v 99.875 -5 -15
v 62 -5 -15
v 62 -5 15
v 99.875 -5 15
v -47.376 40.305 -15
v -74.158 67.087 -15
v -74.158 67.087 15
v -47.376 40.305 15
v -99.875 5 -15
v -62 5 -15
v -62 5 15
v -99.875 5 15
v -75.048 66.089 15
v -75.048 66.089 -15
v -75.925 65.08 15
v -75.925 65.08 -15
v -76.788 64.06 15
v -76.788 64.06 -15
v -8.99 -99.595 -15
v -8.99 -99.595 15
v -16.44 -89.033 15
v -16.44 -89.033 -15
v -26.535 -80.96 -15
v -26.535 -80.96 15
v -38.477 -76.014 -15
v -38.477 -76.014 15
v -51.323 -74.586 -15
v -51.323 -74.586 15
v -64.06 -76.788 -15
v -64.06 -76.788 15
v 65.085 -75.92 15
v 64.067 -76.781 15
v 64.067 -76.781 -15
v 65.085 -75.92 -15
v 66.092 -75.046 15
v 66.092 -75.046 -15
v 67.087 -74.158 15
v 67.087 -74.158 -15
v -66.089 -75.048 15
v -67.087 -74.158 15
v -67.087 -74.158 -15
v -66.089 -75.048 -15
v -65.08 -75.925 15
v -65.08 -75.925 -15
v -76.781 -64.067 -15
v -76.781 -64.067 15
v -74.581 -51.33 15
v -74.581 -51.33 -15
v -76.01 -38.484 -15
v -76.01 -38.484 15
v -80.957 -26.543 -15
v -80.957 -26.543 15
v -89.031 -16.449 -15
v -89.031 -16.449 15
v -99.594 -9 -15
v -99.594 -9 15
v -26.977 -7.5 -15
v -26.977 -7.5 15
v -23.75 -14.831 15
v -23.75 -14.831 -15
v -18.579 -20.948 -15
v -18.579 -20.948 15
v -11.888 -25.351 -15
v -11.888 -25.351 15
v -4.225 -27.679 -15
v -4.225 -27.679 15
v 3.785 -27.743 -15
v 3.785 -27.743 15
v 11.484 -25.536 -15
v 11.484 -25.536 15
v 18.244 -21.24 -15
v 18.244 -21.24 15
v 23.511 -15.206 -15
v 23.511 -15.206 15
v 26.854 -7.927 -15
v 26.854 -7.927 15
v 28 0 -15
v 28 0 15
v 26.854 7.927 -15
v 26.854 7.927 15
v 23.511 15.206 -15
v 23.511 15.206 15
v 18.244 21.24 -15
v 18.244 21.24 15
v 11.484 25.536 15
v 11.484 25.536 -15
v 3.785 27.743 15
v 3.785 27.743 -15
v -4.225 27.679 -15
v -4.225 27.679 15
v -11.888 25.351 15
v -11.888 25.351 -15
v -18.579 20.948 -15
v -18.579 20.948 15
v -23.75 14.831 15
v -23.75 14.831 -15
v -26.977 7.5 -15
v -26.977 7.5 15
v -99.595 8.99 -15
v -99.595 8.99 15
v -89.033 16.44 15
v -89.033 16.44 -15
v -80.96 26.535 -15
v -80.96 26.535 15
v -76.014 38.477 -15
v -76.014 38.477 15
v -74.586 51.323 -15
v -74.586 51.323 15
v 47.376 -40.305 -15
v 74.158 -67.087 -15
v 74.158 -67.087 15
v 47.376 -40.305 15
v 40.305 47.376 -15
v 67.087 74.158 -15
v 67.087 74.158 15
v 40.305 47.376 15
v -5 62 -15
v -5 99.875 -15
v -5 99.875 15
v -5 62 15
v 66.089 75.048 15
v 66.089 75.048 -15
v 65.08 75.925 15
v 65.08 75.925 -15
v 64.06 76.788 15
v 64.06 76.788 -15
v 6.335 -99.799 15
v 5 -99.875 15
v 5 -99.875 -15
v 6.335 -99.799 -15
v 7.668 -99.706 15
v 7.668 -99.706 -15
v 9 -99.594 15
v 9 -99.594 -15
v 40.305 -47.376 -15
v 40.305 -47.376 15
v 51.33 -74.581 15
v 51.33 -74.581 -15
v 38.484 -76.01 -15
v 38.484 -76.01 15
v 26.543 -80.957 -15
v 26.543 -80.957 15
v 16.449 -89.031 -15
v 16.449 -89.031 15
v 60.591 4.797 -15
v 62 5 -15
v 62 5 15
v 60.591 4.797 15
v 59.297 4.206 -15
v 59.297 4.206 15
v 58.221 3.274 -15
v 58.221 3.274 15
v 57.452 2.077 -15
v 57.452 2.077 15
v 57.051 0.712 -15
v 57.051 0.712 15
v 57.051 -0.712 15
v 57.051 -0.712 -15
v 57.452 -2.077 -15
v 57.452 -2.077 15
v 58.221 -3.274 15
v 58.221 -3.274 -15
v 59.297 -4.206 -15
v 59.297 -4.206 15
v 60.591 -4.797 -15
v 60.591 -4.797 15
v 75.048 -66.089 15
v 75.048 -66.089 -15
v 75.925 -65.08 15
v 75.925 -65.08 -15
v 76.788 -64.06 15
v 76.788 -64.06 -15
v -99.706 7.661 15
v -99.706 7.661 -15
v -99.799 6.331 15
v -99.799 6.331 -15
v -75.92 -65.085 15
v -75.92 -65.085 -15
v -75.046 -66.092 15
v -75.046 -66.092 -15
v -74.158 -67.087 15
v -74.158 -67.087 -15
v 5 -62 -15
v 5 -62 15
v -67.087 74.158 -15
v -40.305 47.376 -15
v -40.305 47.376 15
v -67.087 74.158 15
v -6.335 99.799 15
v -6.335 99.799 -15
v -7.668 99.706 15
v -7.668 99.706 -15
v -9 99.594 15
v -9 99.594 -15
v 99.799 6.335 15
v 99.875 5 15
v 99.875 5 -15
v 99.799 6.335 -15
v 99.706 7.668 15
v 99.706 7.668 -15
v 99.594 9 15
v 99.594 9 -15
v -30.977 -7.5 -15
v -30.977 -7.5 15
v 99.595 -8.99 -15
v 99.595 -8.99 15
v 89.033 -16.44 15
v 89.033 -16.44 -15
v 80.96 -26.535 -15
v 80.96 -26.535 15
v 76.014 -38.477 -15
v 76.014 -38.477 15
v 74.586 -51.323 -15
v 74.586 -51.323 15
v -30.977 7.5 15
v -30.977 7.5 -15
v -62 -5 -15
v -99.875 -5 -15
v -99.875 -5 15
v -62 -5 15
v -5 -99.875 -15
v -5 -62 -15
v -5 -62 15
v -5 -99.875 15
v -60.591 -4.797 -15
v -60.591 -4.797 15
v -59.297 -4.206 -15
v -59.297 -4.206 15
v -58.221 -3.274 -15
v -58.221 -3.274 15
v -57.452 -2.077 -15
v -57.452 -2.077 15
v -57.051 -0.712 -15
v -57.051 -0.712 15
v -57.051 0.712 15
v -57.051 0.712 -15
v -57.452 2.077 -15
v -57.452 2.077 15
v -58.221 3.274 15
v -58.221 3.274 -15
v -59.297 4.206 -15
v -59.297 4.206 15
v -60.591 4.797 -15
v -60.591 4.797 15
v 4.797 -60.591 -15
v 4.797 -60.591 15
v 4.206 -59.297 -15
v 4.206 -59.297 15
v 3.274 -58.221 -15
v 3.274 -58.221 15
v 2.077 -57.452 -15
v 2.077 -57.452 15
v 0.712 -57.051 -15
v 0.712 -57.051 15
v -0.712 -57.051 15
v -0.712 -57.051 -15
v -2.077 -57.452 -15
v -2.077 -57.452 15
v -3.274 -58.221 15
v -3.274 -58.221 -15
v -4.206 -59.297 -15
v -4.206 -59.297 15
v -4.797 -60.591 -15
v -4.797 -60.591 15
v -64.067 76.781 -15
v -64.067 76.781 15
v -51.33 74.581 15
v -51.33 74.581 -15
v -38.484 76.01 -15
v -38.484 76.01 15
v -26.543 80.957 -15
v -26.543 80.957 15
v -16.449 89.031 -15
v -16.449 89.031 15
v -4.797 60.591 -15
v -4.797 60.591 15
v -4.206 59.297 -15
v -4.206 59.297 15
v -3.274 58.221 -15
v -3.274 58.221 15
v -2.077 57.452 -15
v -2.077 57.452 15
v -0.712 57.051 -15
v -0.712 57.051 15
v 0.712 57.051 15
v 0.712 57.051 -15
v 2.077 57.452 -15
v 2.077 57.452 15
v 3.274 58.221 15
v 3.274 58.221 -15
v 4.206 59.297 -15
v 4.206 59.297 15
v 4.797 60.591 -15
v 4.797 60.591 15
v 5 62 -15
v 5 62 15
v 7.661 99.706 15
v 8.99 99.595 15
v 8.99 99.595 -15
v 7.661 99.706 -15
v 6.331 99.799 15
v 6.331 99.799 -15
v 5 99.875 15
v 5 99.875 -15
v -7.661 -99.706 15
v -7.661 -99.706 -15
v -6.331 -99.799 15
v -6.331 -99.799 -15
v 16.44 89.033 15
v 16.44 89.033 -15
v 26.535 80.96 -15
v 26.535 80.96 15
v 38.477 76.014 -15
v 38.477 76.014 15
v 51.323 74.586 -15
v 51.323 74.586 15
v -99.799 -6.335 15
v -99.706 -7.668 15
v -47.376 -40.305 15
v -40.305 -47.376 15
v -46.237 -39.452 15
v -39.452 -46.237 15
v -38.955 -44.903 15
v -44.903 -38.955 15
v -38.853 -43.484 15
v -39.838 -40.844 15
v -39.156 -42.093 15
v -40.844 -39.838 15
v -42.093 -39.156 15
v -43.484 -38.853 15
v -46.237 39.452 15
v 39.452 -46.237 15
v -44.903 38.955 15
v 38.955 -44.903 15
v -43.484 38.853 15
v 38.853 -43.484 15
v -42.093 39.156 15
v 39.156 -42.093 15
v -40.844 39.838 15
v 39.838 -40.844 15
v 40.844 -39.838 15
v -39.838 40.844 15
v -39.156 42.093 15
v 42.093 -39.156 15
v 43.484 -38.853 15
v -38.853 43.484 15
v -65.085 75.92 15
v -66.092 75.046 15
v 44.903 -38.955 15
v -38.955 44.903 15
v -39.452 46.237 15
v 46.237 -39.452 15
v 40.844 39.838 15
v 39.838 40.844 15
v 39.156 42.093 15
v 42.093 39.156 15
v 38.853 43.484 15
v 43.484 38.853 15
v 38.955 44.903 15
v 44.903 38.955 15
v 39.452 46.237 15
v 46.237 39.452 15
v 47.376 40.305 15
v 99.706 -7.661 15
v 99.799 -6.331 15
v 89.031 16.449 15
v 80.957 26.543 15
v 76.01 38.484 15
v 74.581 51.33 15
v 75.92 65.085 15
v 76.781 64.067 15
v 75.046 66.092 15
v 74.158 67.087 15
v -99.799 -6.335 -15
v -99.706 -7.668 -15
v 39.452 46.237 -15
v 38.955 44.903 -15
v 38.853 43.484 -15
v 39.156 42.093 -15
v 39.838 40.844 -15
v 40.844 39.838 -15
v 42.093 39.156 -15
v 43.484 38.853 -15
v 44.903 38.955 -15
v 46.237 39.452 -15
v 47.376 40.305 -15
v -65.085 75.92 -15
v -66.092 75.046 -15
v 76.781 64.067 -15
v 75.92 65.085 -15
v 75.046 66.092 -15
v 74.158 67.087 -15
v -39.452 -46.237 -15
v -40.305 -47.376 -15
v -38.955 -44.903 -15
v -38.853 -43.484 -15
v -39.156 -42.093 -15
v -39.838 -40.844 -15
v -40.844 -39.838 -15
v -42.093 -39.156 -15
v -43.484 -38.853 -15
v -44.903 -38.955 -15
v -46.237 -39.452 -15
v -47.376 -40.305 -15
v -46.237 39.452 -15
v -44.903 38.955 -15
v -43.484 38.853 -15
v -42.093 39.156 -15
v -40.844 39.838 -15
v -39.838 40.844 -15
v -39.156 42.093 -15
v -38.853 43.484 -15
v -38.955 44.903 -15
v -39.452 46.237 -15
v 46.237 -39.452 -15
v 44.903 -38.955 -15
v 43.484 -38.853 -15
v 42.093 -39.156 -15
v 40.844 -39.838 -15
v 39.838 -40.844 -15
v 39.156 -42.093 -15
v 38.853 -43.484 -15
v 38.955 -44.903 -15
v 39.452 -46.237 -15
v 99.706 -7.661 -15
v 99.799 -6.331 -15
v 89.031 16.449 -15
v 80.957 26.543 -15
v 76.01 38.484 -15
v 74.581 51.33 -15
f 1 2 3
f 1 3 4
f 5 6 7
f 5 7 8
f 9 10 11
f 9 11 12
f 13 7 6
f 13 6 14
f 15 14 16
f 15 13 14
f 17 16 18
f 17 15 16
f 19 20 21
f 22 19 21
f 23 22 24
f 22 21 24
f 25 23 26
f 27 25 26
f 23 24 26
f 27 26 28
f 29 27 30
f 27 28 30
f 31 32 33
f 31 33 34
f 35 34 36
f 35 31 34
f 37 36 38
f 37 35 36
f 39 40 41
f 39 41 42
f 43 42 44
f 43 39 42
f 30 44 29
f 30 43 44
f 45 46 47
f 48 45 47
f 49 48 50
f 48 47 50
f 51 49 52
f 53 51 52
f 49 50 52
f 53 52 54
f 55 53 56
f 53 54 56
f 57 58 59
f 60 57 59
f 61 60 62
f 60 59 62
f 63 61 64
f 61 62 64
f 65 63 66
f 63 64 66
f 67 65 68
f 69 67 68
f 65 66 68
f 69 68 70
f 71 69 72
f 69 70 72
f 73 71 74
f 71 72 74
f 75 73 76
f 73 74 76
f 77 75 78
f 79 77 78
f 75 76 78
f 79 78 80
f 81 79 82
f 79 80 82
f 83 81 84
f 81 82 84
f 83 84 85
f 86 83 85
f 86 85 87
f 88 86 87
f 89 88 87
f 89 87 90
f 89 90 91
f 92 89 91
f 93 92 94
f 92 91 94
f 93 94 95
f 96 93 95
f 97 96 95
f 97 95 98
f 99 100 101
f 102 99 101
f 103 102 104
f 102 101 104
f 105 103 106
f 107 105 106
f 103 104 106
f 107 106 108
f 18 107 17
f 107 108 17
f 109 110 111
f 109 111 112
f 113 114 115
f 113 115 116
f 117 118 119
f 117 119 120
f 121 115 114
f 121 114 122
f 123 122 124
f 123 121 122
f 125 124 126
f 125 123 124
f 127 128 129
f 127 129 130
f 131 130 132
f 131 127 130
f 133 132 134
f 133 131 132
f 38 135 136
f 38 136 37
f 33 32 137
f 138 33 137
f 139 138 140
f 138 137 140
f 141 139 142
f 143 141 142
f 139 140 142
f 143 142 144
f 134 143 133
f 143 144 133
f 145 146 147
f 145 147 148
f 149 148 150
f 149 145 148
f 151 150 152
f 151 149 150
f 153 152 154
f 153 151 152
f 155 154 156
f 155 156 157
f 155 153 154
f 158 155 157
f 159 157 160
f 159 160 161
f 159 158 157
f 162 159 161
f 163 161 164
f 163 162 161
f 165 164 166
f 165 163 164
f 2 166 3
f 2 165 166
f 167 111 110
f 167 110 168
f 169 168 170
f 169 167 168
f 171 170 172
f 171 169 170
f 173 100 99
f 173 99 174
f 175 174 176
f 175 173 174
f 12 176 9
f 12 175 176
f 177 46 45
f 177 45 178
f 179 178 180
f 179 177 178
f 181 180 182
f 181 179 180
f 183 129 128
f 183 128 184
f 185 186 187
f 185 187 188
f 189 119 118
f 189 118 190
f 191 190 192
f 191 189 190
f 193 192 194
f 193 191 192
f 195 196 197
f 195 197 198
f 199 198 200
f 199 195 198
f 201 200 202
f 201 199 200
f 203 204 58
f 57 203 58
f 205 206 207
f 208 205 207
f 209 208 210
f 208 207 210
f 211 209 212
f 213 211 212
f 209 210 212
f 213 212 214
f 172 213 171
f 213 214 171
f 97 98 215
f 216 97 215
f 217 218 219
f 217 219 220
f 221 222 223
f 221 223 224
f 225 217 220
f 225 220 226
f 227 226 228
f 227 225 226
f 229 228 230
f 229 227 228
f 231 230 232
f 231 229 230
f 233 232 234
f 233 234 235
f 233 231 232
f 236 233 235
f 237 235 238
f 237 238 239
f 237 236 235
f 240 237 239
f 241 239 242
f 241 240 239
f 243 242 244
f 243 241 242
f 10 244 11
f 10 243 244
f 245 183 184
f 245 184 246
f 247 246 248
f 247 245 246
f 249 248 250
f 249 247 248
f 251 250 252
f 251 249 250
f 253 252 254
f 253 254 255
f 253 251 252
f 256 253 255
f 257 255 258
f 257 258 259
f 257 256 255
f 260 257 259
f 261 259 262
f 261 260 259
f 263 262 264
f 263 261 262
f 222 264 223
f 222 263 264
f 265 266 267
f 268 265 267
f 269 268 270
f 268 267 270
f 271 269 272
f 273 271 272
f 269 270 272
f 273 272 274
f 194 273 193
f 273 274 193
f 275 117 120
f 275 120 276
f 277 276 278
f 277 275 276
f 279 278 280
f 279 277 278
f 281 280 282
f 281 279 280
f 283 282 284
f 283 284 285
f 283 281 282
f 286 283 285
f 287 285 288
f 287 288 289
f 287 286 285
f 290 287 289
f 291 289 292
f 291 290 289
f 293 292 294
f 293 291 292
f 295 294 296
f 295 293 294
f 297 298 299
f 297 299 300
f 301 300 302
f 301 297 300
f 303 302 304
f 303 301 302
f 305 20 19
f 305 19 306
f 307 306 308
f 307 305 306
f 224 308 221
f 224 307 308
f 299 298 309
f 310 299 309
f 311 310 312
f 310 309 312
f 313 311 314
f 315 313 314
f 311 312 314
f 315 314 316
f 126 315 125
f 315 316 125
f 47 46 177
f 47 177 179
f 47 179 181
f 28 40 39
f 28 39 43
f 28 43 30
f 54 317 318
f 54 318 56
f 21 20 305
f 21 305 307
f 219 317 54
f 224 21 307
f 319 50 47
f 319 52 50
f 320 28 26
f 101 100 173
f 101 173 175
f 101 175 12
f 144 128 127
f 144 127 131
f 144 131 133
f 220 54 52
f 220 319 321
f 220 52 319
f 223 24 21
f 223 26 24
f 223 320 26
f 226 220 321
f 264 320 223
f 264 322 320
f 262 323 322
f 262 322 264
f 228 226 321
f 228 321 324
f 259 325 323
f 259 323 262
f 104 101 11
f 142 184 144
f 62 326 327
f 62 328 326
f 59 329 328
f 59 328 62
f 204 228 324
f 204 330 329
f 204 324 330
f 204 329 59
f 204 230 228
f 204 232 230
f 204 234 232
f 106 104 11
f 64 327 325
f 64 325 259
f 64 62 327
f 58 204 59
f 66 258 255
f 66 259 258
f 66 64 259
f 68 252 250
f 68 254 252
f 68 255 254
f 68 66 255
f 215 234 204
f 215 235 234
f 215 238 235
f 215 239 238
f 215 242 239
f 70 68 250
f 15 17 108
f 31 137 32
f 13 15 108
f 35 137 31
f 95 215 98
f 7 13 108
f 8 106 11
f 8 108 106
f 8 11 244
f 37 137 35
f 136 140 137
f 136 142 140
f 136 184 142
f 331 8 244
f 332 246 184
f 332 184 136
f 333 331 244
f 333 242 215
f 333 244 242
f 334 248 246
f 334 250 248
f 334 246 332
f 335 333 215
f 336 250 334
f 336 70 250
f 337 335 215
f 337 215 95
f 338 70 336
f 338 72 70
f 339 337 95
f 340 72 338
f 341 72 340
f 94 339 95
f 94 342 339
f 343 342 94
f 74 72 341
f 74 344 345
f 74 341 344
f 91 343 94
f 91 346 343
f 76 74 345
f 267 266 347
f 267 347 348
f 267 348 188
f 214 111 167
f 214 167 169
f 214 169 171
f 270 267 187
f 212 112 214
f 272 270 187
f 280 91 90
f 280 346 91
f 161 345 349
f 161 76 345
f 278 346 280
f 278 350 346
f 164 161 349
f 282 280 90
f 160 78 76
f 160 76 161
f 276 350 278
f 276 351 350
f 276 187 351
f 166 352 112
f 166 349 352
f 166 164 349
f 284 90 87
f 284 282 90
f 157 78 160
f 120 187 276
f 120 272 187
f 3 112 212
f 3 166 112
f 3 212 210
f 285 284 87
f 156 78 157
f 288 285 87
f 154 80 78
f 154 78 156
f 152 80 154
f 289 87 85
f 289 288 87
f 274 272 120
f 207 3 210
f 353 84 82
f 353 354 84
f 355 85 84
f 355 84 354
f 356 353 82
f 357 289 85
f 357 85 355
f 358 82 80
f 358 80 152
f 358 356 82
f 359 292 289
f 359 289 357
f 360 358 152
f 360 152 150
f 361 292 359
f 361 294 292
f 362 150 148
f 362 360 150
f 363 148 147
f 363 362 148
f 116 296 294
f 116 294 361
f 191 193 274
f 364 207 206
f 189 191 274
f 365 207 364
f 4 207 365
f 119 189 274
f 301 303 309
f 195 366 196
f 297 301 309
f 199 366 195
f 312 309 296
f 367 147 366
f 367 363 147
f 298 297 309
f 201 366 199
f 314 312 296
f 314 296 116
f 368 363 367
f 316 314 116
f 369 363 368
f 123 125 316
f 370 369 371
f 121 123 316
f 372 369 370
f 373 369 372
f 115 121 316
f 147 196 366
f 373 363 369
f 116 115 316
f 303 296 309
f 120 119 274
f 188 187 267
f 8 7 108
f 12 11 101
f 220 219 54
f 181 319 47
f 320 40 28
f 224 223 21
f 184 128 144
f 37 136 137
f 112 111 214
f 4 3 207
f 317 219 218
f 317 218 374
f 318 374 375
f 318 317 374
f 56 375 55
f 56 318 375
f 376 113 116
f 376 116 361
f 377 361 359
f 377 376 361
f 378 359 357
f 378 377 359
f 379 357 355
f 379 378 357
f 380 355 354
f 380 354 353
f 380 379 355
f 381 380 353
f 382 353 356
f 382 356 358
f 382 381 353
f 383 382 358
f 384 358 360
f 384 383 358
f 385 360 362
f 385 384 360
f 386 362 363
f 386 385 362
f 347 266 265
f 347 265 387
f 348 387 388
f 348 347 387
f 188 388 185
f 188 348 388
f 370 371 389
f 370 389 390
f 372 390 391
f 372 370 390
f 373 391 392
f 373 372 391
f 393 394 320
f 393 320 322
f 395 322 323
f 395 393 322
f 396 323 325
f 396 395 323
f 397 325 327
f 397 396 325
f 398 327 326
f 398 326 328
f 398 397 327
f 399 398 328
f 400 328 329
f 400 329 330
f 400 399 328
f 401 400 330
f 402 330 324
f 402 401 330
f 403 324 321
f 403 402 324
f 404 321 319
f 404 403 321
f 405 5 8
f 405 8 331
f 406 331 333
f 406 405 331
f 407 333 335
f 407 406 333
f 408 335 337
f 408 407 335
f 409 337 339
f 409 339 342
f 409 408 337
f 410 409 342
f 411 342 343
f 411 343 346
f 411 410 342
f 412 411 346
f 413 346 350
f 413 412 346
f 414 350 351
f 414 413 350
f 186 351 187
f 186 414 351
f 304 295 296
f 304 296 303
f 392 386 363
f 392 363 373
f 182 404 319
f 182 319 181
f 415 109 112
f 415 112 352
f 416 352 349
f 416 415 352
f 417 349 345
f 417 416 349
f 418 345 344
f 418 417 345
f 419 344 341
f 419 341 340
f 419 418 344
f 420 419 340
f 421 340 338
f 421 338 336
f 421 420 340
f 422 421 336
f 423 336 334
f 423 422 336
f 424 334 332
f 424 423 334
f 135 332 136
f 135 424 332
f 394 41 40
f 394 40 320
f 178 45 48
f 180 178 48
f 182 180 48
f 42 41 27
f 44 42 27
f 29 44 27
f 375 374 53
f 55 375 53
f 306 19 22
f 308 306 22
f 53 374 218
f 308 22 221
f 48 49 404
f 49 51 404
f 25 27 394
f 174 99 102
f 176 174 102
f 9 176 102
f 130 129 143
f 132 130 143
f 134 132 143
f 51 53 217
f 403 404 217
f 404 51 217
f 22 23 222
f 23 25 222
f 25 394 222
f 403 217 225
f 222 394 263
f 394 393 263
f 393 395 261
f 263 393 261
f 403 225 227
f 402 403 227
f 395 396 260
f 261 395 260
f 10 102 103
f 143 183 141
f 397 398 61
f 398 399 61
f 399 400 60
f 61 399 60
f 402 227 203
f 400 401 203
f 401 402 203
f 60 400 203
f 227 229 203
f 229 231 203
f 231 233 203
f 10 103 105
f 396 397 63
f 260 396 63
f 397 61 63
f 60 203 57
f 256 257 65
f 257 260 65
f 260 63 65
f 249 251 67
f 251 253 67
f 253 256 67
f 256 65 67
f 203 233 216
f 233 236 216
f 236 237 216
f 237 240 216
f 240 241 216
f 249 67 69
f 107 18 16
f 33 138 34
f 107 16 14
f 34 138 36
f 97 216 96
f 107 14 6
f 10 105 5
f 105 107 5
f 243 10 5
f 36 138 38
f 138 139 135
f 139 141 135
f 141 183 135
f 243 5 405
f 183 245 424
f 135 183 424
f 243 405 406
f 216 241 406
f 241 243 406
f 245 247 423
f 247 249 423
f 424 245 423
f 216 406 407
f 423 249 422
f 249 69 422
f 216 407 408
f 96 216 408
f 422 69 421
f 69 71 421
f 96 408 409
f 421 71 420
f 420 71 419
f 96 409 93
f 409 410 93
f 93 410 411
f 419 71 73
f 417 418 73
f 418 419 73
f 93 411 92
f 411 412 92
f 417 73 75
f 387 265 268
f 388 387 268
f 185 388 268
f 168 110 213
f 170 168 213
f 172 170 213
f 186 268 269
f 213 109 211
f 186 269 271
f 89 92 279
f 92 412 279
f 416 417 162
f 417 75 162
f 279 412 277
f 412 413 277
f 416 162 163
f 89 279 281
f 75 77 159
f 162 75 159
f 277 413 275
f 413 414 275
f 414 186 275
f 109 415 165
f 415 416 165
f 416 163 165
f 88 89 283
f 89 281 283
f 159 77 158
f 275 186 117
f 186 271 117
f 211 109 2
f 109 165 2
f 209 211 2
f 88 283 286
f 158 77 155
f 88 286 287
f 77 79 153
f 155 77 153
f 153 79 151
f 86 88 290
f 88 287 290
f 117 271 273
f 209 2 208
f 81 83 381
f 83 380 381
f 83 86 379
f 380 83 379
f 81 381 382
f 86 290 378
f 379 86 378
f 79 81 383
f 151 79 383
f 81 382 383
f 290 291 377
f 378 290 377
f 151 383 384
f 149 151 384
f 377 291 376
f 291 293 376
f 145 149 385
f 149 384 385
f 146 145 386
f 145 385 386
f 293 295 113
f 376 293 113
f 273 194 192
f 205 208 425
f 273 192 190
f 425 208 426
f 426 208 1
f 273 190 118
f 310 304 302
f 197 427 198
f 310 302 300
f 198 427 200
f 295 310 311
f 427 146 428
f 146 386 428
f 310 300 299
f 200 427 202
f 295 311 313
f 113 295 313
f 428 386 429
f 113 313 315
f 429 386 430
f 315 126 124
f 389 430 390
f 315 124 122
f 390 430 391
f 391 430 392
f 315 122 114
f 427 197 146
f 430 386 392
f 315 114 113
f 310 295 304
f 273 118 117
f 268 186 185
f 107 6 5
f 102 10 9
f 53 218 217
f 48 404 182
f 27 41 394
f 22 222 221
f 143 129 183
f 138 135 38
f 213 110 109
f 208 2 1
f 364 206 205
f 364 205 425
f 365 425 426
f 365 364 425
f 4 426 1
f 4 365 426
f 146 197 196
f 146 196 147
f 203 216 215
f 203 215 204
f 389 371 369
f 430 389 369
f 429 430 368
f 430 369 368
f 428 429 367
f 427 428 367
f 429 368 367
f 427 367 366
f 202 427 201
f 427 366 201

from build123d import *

# Parameters (mm, degrees)
SKETCH1_R           = 100
BOSS_EXTRUDE1_DEPTH = 15
CUT_EXTRUDE2_START  = -30
CUT_EXTRUDE2_DEPTH  = 30
CIRPATTERN1_COUNT   = 8
CUT_EXTRUDE3_DEPTH  = 30
CIRPATTERN2_COUNT   = 8
CUT_EXTRUDE4_DEPTH  = 35


# Read off the part's stored shape, not the designer's step: Cut-Extrude2
with BuildPart() as part:
    # Sketch1 → Boss-Extrude1 (new, symmetric)
    with BuildSketch(Plane.XY):
        Circle(SKETCH1_R)
    extrude(amount=BOSS_EXTRUDE1_DEPTH, both=True)

    # Cut-Extrude2 outline → Cut-Extrude2 (cut)
    with BuildSketch(Plane.XY.offset(15).offset(CUT_EXTRUDE2_START)):
        with BuildLine():
            ThreePointArc((62, 5), (57, 0), (62, -5))
            Line((62, -5), (99.874921777, -5))
            ThreePointArc((99.874921777, -5), (100, 0), (99.874921777, 5))
            Line((99.874921777, 5), (62, 5))
        make_face()
    cut_extrude2 = extrude(amount=CUT_EXTRUDE2_DEPTH, mode=Mode.SUBTRACT)

    # CirPattern1: Cut-Extrude2 ×8 about axis
    cirpattern1_axis = Axis((0, 0, 15), (0, 0, -1))
    for i in range(1, CIRPATTERN1_COUNT):
        add(cut_extrude2.rotate(cirpattern1_axis, i * 360 / CIRPATTERN1_COUNT), mode=Mode.SUBTRACT)

    # Sketch8 → Cut-Extrude3 (cut)
    with BuildSketch(Plane.XY.offset(15)):
        with BuildLine():
            ThreePointArc((76.781373425, 64.06731378), (78.062131756, 32.338894345), (99.594176537, 9))
            ThreePointArc((99.594176537, 9), (92.386069934, 38.27288965), (76.781373425, 64.06731378))
        make_face()
    cut_extrude3 = extrude(amount=-CUT_EXTRUDE3_DEPTH, mode=Mode.SUBTRACT)

    # CirPattern2: Cut-Extrude3 ×8 about axis
    cirpattern2_axis = Axis((0, 0, 0), (0, 0, 1))
    for i in range(1, CIRPATTERN2_COUNT):
        add(cut_extrude3.rotate(cirpattern2_axis, i * 360 / CIRPATTERN2_COUNT), mode=Mode.SUBTRACT)

    # Sketch9 → Cut-Extrude4 (cut, symmetric)
    with BuildSketch(Plane.XY.offset(15)):
        with BuildLine():
            Line((-26.97684192, 7.5), (-30.97684192, 7.5))
            Line((-30.97684192, 7.5), (-30.97684192, -7.5))
            Line((-30.97684192, -7.5), (-26.97684192, -7.5))
            ThreePointArc((-26.97684192, -7.5), (28, 0), (-26.97684192, 7.5))
        make_face()
    extrude(amount=CUT_EXTRUDE4_DEPTH, both=True, mode=Mode.SUBTRACT)


solid = part.part
